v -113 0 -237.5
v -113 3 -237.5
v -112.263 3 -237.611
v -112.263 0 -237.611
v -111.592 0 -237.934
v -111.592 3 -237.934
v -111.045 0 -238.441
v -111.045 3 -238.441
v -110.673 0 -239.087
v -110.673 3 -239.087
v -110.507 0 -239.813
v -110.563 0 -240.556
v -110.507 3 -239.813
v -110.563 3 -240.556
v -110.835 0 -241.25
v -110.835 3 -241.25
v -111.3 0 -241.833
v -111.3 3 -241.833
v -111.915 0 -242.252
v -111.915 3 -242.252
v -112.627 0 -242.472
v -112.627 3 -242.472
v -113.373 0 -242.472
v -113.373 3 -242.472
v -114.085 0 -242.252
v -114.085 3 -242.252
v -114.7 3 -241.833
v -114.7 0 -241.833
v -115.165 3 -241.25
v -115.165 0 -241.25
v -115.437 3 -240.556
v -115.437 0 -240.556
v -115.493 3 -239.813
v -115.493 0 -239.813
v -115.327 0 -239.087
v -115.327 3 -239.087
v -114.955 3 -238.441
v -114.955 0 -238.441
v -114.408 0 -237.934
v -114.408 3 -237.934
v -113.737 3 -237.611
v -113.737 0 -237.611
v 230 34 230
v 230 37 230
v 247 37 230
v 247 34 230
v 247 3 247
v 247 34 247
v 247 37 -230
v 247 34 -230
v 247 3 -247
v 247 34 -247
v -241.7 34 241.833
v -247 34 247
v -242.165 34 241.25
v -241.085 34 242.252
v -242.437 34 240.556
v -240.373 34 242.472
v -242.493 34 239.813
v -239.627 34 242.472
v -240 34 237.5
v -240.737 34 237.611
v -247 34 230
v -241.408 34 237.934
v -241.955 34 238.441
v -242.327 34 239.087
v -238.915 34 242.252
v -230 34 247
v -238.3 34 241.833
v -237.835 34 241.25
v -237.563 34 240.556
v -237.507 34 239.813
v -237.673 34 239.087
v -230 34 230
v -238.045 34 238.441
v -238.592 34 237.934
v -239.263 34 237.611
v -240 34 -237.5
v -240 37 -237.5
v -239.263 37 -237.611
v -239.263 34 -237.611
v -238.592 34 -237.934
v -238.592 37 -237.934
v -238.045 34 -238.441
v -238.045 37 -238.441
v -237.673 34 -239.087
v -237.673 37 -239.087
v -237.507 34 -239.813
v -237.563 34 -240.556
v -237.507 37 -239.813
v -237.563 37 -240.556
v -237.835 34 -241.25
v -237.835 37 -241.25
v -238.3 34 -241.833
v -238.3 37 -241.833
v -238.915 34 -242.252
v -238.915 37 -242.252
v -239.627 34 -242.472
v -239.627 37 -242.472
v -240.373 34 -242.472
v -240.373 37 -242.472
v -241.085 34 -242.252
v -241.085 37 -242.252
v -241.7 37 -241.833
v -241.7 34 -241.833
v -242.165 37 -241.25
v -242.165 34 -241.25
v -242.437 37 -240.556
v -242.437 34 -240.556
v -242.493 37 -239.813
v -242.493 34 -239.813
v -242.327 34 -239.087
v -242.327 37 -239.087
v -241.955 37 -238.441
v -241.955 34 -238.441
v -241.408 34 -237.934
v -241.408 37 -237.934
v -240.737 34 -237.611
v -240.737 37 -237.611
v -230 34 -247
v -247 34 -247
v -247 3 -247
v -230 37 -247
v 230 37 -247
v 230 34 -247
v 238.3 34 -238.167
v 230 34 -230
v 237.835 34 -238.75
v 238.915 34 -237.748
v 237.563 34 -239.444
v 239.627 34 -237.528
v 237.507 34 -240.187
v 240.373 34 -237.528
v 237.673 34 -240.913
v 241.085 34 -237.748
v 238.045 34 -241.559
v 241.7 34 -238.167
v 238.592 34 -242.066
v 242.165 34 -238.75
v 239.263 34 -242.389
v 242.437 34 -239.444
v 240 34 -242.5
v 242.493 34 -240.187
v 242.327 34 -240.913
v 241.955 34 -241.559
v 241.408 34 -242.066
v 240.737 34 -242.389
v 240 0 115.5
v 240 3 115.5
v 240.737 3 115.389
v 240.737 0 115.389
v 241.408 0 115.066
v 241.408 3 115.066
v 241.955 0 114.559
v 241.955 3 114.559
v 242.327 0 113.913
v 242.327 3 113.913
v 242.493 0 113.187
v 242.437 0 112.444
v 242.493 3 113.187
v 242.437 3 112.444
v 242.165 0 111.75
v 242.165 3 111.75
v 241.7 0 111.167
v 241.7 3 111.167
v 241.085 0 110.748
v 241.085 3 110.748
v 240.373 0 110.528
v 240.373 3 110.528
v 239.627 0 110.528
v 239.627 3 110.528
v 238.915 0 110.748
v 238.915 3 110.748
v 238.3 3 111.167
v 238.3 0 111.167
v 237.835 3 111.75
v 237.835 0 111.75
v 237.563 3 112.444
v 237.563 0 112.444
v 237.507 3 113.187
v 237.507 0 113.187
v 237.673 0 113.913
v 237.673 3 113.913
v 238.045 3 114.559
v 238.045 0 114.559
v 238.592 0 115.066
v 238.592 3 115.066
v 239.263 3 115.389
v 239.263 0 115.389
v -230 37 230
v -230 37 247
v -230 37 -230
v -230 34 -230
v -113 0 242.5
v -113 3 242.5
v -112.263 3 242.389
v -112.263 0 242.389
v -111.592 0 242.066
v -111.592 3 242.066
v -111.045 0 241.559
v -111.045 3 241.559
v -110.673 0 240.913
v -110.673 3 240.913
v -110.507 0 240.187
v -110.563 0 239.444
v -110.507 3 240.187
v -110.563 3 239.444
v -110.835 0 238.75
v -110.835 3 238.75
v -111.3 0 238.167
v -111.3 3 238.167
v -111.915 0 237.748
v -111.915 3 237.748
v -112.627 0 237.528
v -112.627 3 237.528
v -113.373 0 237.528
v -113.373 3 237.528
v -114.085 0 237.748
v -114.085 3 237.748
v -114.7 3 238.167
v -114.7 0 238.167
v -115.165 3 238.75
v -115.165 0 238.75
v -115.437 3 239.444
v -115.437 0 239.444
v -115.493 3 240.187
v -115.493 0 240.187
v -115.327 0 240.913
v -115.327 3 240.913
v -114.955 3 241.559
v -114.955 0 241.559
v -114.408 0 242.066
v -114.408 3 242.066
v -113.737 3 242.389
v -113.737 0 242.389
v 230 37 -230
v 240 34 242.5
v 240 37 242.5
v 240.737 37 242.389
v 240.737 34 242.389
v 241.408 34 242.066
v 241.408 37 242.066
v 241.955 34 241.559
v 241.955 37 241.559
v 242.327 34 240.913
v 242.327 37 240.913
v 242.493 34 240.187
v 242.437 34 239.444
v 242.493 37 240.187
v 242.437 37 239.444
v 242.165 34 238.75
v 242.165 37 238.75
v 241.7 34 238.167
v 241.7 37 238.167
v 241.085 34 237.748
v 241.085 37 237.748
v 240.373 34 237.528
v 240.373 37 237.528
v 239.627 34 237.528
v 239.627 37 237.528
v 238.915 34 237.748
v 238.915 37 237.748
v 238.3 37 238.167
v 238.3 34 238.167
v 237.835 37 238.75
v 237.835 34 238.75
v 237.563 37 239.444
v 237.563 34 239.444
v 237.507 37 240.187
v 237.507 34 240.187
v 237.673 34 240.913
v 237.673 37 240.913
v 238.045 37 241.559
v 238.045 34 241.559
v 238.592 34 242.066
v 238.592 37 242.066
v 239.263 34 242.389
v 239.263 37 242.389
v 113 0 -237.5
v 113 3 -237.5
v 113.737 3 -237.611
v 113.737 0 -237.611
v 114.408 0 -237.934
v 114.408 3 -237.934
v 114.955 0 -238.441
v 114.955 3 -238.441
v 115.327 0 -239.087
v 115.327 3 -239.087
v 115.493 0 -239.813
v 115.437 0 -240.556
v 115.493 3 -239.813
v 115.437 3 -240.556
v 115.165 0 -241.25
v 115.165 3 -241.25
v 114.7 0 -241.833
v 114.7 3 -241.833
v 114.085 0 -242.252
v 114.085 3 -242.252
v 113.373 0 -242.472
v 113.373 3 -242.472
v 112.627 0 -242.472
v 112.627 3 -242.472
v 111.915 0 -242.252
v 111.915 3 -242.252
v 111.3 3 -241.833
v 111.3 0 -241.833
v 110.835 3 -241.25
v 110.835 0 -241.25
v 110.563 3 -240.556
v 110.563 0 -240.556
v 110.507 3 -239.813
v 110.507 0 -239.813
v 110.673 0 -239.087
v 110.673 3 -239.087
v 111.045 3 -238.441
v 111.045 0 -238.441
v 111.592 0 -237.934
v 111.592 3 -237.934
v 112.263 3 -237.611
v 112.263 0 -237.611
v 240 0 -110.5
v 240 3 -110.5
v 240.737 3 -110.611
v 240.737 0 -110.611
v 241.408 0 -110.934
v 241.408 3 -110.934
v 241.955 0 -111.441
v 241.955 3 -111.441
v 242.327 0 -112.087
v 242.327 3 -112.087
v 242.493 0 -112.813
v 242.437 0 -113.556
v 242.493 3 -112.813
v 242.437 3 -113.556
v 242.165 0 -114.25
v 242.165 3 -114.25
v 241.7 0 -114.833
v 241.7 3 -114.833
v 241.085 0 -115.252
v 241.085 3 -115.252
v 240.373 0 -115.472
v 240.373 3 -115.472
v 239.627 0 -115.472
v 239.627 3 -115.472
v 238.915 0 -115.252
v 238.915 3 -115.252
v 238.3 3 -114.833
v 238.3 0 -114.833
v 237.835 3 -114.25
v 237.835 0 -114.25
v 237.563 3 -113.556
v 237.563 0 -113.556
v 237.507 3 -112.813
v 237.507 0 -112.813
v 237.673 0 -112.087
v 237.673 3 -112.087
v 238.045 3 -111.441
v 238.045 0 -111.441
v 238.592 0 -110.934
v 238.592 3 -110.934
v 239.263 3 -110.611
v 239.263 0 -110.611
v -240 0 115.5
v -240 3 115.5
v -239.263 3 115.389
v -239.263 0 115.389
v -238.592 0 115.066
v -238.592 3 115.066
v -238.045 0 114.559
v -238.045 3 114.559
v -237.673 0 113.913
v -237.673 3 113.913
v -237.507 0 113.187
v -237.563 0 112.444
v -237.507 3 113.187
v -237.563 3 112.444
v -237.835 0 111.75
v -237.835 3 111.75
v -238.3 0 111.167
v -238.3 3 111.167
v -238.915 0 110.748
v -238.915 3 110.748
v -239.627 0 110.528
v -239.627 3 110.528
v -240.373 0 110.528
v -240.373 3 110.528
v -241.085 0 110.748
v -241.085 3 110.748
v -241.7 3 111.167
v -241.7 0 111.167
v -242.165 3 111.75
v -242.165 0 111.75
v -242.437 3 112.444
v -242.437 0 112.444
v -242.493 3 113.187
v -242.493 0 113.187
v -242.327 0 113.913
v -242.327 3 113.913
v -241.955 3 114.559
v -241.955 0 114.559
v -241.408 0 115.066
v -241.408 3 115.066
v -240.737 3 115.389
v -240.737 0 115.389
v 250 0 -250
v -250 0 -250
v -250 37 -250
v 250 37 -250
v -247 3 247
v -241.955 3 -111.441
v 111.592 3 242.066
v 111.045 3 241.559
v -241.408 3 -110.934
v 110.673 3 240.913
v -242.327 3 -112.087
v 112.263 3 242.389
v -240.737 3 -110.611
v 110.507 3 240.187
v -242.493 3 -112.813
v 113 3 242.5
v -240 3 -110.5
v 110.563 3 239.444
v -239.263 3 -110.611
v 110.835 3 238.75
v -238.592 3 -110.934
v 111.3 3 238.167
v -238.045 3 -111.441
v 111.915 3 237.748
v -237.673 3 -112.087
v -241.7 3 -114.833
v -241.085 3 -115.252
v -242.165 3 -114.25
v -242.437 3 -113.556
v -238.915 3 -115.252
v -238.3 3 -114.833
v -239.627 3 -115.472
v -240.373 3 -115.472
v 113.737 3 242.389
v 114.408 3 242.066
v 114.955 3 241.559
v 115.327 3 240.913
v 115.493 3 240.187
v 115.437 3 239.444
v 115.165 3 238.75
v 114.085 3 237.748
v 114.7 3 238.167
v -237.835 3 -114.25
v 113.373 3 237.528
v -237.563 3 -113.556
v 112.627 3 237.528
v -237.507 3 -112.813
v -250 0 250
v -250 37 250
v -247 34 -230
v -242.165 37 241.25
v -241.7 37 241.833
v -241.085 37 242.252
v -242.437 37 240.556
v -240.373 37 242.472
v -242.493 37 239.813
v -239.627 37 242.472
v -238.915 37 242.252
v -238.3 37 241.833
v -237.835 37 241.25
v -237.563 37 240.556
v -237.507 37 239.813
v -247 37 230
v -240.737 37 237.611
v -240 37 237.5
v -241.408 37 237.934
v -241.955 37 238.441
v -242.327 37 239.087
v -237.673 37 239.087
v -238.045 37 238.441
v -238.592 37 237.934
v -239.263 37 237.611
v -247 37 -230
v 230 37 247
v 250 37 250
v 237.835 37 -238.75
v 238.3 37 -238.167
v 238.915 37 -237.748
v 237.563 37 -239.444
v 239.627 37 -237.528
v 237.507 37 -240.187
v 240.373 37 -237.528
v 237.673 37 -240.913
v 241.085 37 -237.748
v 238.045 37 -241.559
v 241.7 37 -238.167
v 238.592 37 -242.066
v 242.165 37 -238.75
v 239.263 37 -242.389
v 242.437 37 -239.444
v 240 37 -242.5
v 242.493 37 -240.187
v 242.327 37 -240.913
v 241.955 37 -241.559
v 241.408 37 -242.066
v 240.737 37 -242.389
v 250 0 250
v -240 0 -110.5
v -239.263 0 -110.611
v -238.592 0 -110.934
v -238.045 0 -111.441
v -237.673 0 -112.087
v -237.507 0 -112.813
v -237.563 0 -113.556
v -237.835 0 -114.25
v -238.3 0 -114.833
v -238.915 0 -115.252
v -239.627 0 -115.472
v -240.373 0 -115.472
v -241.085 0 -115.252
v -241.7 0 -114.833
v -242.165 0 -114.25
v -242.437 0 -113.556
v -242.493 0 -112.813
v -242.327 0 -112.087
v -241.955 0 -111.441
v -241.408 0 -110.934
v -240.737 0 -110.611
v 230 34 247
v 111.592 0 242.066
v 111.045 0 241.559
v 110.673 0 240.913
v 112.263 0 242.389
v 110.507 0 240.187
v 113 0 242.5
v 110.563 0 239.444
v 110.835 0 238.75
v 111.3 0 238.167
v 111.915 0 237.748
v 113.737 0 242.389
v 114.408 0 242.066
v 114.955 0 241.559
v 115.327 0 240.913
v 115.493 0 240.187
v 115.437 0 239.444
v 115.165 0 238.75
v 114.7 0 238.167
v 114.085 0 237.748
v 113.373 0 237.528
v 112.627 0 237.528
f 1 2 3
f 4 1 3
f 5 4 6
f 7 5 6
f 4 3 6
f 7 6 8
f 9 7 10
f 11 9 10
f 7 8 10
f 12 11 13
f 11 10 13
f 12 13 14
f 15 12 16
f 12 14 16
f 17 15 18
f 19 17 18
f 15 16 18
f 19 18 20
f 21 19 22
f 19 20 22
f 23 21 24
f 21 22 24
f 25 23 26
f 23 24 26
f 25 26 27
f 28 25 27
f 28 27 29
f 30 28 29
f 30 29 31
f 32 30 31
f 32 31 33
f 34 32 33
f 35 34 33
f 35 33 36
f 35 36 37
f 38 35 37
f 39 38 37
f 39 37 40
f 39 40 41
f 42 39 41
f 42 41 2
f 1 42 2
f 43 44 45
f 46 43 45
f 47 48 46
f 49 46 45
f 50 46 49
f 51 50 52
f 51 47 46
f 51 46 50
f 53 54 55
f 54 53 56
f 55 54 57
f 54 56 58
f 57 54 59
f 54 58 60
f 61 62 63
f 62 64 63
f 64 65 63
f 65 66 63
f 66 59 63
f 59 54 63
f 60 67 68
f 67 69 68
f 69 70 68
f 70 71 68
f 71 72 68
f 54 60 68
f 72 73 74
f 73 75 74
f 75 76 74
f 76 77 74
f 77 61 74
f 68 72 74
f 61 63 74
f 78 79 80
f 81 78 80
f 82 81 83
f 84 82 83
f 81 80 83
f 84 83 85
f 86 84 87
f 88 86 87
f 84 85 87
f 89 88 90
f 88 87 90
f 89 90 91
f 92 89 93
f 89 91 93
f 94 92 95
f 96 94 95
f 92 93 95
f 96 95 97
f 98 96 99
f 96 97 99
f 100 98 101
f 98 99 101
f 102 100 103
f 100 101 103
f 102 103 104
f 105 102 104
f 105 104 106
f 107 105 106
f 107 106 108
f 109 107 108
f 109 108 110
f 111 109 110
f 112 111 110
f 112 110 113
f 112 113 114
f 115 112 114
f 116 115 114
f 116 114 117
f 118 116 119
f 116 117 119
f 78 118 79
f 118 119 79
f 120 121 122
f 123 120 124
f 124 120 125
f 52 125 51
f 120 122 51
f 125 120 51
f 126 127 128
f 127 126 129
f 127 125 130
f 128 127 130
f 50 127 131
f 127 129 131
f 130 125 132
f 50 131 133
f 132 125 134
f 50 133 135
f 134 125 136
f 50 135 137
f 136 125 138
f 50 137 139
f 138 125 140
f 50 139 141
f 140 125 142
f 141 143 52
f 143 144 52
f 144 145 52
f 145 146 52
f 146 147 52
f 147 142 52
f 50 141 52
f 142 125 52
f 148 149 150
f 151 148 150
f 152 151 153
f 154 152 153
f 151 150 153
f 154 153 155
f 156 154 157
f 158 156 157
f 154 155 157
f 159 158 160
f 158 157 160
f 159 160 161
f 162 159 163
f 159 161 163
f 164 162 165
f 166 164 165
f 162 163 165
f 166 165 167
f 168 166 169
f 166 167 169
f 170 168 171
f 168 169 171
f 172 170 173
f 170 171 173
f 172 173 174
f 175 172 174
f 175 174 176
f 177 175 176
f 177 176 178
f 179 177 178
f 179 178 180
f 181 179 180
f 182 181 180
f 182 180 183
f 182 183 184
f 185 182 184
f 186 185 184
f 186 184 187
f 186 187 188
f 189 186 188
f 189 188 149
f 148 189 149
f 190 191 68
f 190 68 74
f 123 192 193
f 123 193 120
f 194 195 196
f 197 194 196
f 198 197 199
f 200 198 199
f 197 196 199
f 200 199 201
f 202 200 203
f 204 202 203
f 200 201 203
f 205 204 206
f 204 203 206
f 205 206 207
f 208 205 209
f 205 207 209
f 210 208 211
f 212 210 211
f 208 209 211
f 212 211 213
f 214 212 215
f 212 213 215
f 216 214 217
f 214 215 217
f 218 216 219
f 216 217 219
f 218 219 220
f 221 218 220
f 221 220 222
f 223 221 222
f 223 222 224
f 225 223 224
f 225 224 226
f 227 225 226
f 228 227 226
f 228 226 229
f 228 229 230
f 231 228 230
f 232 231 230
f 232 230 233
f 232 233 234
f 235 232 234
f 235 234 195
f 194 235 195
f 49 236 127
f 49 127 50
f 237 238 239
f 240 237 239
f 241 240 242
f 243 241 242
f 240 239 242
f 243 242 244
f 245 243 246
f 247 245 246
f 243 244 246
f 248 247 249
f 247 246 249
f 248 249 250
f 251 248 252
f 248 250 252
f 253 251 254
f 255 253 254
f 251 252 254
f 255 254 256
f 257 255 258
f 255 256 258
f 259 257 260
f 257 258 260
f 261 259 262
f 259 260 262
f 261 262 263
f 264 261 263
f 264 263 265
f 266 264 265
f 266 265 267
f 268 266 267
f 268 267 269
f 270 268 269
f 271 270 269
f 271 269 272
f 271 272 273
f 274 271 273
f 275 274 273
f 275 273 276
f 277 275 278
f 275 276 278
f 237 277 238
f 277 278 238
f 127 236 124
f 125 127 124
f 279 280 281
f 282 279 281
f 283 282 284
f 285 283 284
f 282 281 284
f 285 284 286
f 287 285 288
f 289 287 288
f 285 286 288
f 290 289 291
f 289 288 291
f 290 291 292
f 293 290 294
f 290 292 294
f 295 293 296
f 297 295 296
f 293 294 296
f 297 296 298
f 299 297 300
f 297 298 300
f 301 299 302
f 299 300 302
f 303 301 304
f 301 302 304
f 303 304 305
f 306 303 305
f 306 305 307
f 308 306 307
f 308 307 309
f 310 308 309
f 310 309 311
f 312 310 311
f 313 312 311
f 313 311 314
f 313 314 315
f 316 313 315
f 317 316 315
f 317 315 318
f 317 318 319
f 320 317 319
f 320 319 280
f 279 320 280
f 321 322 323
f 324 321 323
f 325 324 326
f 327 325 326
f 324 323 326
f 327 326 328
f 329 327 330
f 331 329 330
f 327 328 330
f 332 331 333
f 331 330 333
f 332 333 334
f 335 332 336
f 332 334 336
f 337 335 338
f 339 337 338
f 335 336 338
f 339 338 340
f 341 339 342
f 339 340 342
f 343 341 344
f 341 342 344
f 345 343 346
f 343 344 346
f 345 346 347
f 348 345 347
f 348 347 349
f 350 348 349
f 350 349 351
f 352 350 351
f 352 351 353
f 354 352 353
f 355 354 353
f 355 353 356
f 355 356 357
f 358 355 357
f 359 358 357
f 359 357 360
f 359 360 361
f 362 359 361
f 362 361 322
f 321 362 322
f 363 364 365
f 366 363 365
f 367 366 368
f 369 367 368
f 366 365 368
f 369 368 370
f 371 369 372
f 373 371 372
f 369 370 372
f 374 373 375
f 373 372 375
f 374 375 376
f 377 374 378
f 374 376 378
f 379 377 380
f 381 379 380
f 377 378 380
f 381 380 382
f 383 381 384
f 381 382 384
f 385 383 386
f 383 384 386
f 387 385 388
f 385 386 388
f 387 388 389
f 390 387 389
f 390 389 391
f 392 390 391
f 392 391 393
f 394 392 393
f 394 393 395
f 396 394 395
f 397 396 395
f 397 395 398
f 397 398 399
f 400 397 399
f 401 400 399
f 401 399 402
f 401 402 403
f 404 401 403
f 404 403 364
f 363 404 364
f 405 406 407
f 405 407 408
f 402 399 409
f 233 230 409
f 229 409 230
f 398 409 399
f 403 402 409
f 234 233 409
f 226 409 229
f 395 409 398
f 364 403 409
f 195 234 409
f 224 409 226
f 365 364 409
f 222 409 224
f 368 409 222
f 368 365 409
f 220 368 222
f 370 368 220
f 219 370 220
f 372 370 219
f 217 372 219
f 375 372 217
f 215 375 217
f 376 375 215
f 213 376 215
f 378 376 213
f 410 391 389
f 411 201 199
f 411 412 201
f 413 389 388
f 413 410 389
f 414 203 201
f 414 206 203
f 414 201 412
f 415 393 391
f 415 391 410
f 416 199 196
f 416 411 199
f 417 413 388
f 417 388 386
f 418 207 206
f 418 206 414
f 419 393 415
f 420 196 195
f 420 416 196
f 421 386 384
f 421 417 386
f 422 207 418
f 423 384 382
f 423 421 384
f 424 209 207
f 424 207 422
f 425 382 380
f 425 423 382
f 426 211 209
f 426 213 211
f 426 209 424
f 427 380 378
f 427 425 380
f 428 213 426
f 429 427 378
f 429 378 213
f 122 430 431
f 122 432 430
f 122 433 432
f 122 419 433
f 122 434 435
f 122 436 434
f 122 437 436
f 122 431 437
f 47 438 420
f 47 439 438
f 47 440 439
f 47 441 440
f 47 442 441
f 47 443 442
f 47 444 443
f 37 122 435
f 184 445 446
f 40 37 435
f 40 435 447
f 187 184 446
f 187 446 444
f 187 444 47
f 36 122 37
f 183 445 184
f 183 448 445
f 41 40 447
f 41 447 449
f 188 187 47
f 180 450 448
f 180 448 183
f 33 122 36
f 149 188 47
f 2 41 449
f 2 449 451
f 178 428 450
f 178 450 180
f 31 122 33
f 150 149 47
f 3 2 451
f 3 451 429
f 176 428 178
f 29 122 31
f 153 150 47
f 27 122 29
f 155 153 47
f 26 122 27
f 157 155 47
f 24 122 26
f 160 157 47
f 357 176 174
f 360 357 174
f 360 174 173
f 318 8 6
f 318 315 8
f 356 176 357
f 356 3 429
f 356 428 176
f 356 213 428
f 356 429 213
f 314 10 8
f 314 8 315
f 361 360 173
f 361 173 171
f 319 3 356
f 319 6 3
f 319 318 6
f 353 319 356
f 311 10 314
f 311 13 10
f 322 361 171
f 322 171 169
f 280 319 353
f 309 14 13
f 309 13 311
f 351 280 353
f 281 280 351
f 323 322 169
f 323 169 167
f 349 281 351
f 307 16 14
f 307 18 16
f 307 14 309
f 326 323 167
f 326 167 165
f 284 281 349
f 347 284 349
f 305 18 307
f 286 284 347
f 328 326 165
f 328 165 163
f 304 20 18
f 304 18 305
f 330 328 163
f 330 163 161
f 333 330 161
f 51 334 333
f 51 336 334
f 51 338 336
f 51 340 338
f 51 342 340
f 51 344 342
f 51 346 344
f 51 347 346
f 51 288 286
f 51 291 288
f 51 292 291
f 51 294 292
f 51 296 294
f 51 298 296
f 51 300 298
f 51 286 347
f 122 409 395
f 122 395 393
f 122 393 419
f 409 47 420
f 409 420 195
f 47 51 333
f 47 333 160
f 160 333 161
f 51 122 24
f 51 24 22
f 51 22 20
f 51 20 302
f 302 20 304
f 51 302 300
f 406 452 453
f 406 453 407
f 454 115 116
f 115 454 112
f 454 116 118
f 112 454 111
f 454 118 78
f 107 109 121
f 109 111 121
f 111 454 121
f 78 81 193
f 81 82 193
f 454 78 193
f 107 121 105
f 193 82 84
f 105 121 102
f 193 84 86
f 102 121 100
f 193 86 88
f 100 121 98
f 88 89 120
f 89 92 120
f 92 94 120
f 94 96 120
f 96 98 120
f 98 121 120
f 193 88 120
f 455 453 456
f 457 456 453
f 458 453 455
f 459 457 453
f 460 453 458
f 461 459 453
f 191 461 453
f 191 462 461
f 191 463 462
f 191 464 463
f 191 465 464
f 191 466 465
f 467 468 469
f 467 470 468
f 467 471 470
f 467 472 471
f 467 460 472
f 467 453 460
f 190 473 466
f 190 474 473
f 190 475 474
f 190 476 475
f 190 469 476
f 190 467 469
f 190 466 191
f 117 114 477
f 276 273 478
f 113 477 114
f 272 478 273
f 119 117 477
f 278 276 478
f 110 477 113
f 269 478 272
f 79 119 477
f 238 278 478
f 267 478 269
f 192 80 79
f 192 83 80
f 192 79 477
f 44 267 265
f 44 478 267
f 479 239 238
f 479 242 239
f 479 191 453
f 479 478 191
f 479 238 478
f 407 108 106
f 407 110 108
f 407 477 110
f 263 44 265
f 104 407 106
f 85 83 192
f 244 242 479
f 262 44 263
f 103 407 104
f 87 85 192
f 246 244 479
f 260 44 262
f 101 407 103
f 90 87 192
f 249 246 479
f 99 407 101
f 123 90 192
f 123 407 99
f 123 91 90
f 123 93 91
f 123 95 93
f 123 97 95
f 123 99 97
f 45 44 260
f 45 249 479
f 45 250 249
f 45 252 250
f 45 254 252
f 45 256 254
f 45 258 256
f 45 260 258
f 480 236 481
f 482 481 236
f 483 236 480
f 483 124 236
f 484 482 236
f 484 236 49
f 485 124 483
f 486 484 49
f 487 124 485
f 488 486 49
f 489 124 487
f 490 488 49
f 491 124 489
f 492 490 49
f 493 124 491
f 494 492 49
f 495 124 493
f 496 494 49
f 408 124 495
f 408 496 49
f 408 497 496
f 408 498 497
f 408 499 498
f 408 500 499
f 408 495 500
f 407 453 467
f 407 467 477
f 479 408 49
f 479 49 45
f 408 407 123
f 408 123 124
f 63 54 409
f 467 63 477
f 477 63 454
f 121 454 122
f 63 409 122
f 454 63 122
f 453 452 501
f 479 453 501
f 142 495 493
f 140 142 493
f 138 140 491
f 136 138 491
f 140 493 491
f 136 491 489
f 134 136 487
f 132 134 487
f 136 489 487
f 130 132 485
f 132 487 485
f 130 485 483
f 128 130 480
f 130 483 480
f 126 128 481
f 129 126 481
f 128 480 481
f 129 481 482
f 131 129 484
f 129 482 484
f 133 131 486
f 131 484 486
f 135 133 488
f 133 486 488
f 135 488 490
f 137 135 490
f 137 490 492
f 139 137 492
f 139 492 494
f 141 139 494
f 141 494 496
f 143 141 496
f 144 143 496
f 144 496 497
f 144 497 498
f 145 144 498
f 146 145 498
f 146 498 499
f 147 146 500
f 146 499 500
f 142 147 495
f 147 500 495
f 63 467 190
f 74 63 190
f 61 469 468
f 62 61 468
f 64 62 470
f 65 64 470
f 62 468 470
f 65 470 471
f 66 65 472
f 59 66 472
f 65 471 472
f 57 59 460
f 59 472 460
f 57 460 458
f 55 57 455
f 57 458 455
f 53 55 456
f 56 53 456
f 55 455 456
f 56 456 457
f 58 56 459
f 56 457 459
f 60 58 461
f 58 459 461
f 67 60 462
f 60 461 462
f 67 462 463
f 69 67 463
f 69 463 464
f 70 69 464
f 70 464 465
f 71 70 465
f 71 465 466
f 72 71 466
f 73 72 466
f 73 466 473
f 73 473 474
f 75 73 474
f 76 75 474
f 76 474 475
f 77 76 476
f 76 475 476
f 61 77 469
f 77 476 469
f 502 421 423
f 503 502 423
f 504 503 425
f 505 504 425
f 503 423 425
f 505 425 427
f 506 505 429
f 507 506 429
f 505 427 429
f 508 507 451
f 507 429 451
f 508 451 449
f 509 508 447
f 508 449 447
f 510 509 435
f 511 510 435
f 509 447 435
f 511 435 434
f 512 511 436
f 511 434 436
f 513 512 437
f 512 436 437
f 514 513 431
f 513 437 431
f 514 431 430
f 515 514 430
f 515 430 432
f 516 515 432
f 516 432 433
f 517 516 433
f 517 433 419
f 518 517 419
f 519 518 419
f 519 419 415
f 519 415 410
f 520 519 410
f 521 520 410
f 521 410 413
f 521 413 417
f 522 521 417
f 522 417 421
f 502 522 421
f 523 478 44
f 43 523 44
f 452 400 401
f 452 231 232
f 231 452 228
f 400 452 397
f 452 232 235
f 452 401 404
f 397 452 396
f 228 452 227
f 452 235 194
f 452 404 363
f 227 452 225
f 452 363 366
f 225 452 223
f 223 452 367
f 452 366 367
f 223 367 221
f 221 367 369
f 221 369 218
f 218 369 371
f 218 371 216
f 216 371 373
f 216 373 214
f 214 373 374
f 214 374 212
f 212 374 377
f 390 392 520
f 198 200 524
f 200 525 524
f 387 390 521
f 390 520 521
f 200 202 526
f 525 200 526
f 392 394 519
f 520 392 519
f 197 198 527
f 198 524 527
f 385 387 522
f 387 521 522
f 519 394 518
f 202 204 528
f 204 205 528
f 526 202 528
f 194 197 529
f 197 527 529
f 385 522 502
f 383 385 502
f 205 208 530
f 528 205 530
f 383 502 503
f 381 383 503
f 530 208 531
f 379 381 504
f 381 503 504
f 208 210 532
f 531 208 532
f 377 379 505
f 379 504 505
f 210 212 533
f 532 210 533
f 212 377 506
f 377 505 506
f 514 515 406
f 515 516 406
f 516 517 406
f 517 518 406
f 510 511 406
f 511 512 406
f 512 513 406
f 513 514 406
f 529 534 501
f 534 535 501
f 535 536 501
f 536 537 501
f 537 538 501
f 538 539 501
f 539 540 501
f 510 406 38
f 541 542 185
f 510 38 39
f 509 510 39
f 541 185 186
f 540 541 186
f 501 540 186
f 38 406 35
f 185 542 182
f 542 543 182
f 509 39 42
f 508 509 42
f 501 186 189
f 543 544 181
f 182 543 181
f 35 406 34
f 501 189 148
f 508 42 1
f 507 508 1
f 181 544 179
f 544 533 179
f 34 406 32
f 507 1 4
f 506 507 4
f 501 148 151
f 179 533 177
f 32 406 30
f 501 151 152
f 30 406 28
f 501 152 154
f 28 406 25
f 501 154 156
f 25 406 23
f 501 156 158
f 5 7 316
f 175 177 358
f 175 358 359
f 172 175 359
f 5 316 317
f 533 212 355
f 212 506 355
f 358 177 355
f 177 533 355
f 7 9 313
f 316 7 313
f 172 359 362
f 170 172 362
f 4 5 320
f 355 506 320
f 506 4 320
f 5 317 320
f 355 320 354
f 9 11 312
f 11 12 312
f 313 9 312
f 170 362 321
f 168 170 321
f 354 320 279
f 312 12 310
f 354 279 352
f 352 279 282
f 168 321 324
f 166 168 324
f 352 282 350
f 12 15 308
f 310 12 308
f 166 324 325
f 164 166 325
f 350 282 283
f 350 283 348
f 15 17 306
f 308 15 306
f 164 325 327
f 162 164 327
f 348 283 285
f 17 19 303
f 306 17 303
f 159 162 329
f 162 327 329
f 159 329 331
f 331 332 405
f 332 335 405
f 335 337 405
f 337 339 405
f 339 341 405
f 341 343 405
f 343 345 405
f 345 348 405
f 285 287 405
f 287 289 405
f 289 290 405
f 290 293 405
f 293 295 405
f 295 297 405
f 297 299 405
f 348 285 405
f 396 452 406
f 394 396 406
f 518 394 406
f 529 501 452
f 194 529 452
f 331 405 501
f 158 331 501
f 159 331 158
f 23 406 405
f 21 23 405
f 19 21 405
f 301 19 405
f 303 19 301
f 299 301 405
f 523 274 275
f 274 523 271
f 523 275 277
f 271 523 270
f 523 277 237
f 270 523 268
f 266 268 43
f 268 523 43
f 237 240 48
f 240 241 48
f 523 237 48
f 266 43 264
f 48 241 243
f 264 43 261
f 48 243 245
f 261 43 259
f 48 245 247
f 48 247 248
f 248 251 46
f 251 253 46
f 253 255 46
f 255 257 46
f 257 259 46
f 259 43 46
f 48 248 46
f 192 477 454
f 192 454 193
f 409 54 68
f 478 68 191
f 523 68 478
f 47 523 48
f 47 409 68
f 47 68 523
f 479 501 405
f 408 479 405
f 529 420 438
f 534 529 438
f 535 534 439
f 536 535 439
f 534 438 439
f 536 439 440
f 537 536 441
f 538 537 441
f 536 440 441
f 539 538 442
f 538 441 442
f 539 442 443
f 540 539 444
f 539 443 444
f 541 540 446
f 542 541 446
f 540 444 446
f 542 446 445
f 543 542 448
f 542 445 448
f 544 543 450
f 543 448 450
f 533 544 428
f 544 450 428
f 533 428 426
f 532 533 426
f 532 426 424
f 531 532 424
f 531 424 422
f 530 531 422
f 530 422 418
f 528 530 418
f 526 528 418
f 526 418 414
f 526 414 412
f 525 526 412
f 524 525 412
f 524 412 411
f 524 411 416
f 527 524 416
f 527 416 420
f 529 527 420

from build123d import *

# Parameters (mm, degrees)
SKETCH1_W           = 500
SKETCH1_H           = 500
BOSS_EXTRUDE1_DEPTH = 37
SHELL1_T            = -3
SKETCH3_R           = 2.5
CUT_EXTRUDE1_DEPTH  = 37
SKETCH4_W           = 17
SKETCH4_H           = 17
BOSS_EXTRUDE2_DEPTH = 3
SKETCH5_R           = 2.5
CUT_EXTRUDE2_DEPTH  = 3


with BuildPart() as part:
    # Sketch1 → Boss-Extrude1 (new body)
    with BuildSketch(Plane(origin=(0, 0, 0), x_dir=(1, 0, 0), z_dir=(0, 1, 0))):
        Rectangle(SKETCH1_W, SKETCH1_H)
    extrude(amount=BOSS_EXTRUDE1_DEPTH)

    # Shell1
    shell1_openings = [part.faces().sort_by_distance(p)[0] for p in [
        (0, 37, 0),
    ]]
    offset(amount=SHELL1_T, openings=shell1_openings, kind=Kind.INTERSECTION)

    # Sketch3 → Cut-Extrude1 (cut)
    with BuildSketch(Plane(origin=(0, 37, 0), x_dir=(1, 0, 0), z_dir=(0, 1, 0))):
        with Locations(Location((113, -240, 0), (0, 0, 270))):
            Circle(SKETCH3_R)
        with Locations(Location((-113, -240, 0), (0, 0, 270))):
            Circle(SKETCH3_R)
        with Locations(Location((240, 113, 0), (0, 0, 270))):
            Circle(SKETCH3_R)
        with Locations(Location((240, -113, 0), (0, 0, 270))):
            Circle(SKETCH3_R)
        with Locations(Location((-240, -113, 0), (0, 0, 270))):
            Circle(SKETCH3_R)
        with Locations(Location((-240, 113, 0), (0, 0, 270))):
            Circle(SKETCH3_R)
        with Locations(Location((-113, 240, 0), (0, 0, 270))):
            Circle(SKETCH3_R)
        with Locations(Location((113, 240, 0), (0, 0, 270))):
            Circle(SKETCH3_R)
    extrude(amount=-CUT_EXTRUDE1_DEPTH, mode=Mode.SUBTRACT)

    # Sketch4 → Boss-Extrude2 (add)
    with BuildSketch(Plane(origin=(0, 37, 0), x_dir=(1, 0, 0), z_dir=(0, 1, 0))):
        with Locations((-238.5, 238.5)):
            Rectangle(SKETCH4_W, SKETCH4_H)
        with Locations((238.5, 238.5)):
            Rectangle(SKETCH4_W, SKETCH4_H)
        with Locations((238.5, -238.5)):
            Rectangle(SKETCH4_W, SKETCH4_H)
        with Locations((-238.5, -238.5)):
            Rectangle(SKETCH4_W, SKETCH4_H)
    extrude(amount=-BOSS_EXTRUDE2_DEPTH)

    # Sketch5 → Cut-Extrude2 (cut)
    with BuildSketch(Plane(origin=(0, 37, 0), x_dir=(1, 0, 0), z_dir=(0, 1, 0))):
        with Locations(Location((-240, 240, 0), (0, 0, 270))):
            Circle(SKETCH5_R)
        with Locations(Location((240, 240, 0), (0, 0, 90))):
            Circle(SKETCH5_R)
        with Locations(Location((240, -240, 0), (0, 0, 270))):
            Circle(SKETCH5_R)
        with Locations(Location((-240, -240, 0), (0, 0, 90))):
            Circle(SKETCH5_R)
    extrude(amount=-CUT_EXTRUDE2_DEPTH, mode=Mode.SUBTRACT)


solid = part.part
